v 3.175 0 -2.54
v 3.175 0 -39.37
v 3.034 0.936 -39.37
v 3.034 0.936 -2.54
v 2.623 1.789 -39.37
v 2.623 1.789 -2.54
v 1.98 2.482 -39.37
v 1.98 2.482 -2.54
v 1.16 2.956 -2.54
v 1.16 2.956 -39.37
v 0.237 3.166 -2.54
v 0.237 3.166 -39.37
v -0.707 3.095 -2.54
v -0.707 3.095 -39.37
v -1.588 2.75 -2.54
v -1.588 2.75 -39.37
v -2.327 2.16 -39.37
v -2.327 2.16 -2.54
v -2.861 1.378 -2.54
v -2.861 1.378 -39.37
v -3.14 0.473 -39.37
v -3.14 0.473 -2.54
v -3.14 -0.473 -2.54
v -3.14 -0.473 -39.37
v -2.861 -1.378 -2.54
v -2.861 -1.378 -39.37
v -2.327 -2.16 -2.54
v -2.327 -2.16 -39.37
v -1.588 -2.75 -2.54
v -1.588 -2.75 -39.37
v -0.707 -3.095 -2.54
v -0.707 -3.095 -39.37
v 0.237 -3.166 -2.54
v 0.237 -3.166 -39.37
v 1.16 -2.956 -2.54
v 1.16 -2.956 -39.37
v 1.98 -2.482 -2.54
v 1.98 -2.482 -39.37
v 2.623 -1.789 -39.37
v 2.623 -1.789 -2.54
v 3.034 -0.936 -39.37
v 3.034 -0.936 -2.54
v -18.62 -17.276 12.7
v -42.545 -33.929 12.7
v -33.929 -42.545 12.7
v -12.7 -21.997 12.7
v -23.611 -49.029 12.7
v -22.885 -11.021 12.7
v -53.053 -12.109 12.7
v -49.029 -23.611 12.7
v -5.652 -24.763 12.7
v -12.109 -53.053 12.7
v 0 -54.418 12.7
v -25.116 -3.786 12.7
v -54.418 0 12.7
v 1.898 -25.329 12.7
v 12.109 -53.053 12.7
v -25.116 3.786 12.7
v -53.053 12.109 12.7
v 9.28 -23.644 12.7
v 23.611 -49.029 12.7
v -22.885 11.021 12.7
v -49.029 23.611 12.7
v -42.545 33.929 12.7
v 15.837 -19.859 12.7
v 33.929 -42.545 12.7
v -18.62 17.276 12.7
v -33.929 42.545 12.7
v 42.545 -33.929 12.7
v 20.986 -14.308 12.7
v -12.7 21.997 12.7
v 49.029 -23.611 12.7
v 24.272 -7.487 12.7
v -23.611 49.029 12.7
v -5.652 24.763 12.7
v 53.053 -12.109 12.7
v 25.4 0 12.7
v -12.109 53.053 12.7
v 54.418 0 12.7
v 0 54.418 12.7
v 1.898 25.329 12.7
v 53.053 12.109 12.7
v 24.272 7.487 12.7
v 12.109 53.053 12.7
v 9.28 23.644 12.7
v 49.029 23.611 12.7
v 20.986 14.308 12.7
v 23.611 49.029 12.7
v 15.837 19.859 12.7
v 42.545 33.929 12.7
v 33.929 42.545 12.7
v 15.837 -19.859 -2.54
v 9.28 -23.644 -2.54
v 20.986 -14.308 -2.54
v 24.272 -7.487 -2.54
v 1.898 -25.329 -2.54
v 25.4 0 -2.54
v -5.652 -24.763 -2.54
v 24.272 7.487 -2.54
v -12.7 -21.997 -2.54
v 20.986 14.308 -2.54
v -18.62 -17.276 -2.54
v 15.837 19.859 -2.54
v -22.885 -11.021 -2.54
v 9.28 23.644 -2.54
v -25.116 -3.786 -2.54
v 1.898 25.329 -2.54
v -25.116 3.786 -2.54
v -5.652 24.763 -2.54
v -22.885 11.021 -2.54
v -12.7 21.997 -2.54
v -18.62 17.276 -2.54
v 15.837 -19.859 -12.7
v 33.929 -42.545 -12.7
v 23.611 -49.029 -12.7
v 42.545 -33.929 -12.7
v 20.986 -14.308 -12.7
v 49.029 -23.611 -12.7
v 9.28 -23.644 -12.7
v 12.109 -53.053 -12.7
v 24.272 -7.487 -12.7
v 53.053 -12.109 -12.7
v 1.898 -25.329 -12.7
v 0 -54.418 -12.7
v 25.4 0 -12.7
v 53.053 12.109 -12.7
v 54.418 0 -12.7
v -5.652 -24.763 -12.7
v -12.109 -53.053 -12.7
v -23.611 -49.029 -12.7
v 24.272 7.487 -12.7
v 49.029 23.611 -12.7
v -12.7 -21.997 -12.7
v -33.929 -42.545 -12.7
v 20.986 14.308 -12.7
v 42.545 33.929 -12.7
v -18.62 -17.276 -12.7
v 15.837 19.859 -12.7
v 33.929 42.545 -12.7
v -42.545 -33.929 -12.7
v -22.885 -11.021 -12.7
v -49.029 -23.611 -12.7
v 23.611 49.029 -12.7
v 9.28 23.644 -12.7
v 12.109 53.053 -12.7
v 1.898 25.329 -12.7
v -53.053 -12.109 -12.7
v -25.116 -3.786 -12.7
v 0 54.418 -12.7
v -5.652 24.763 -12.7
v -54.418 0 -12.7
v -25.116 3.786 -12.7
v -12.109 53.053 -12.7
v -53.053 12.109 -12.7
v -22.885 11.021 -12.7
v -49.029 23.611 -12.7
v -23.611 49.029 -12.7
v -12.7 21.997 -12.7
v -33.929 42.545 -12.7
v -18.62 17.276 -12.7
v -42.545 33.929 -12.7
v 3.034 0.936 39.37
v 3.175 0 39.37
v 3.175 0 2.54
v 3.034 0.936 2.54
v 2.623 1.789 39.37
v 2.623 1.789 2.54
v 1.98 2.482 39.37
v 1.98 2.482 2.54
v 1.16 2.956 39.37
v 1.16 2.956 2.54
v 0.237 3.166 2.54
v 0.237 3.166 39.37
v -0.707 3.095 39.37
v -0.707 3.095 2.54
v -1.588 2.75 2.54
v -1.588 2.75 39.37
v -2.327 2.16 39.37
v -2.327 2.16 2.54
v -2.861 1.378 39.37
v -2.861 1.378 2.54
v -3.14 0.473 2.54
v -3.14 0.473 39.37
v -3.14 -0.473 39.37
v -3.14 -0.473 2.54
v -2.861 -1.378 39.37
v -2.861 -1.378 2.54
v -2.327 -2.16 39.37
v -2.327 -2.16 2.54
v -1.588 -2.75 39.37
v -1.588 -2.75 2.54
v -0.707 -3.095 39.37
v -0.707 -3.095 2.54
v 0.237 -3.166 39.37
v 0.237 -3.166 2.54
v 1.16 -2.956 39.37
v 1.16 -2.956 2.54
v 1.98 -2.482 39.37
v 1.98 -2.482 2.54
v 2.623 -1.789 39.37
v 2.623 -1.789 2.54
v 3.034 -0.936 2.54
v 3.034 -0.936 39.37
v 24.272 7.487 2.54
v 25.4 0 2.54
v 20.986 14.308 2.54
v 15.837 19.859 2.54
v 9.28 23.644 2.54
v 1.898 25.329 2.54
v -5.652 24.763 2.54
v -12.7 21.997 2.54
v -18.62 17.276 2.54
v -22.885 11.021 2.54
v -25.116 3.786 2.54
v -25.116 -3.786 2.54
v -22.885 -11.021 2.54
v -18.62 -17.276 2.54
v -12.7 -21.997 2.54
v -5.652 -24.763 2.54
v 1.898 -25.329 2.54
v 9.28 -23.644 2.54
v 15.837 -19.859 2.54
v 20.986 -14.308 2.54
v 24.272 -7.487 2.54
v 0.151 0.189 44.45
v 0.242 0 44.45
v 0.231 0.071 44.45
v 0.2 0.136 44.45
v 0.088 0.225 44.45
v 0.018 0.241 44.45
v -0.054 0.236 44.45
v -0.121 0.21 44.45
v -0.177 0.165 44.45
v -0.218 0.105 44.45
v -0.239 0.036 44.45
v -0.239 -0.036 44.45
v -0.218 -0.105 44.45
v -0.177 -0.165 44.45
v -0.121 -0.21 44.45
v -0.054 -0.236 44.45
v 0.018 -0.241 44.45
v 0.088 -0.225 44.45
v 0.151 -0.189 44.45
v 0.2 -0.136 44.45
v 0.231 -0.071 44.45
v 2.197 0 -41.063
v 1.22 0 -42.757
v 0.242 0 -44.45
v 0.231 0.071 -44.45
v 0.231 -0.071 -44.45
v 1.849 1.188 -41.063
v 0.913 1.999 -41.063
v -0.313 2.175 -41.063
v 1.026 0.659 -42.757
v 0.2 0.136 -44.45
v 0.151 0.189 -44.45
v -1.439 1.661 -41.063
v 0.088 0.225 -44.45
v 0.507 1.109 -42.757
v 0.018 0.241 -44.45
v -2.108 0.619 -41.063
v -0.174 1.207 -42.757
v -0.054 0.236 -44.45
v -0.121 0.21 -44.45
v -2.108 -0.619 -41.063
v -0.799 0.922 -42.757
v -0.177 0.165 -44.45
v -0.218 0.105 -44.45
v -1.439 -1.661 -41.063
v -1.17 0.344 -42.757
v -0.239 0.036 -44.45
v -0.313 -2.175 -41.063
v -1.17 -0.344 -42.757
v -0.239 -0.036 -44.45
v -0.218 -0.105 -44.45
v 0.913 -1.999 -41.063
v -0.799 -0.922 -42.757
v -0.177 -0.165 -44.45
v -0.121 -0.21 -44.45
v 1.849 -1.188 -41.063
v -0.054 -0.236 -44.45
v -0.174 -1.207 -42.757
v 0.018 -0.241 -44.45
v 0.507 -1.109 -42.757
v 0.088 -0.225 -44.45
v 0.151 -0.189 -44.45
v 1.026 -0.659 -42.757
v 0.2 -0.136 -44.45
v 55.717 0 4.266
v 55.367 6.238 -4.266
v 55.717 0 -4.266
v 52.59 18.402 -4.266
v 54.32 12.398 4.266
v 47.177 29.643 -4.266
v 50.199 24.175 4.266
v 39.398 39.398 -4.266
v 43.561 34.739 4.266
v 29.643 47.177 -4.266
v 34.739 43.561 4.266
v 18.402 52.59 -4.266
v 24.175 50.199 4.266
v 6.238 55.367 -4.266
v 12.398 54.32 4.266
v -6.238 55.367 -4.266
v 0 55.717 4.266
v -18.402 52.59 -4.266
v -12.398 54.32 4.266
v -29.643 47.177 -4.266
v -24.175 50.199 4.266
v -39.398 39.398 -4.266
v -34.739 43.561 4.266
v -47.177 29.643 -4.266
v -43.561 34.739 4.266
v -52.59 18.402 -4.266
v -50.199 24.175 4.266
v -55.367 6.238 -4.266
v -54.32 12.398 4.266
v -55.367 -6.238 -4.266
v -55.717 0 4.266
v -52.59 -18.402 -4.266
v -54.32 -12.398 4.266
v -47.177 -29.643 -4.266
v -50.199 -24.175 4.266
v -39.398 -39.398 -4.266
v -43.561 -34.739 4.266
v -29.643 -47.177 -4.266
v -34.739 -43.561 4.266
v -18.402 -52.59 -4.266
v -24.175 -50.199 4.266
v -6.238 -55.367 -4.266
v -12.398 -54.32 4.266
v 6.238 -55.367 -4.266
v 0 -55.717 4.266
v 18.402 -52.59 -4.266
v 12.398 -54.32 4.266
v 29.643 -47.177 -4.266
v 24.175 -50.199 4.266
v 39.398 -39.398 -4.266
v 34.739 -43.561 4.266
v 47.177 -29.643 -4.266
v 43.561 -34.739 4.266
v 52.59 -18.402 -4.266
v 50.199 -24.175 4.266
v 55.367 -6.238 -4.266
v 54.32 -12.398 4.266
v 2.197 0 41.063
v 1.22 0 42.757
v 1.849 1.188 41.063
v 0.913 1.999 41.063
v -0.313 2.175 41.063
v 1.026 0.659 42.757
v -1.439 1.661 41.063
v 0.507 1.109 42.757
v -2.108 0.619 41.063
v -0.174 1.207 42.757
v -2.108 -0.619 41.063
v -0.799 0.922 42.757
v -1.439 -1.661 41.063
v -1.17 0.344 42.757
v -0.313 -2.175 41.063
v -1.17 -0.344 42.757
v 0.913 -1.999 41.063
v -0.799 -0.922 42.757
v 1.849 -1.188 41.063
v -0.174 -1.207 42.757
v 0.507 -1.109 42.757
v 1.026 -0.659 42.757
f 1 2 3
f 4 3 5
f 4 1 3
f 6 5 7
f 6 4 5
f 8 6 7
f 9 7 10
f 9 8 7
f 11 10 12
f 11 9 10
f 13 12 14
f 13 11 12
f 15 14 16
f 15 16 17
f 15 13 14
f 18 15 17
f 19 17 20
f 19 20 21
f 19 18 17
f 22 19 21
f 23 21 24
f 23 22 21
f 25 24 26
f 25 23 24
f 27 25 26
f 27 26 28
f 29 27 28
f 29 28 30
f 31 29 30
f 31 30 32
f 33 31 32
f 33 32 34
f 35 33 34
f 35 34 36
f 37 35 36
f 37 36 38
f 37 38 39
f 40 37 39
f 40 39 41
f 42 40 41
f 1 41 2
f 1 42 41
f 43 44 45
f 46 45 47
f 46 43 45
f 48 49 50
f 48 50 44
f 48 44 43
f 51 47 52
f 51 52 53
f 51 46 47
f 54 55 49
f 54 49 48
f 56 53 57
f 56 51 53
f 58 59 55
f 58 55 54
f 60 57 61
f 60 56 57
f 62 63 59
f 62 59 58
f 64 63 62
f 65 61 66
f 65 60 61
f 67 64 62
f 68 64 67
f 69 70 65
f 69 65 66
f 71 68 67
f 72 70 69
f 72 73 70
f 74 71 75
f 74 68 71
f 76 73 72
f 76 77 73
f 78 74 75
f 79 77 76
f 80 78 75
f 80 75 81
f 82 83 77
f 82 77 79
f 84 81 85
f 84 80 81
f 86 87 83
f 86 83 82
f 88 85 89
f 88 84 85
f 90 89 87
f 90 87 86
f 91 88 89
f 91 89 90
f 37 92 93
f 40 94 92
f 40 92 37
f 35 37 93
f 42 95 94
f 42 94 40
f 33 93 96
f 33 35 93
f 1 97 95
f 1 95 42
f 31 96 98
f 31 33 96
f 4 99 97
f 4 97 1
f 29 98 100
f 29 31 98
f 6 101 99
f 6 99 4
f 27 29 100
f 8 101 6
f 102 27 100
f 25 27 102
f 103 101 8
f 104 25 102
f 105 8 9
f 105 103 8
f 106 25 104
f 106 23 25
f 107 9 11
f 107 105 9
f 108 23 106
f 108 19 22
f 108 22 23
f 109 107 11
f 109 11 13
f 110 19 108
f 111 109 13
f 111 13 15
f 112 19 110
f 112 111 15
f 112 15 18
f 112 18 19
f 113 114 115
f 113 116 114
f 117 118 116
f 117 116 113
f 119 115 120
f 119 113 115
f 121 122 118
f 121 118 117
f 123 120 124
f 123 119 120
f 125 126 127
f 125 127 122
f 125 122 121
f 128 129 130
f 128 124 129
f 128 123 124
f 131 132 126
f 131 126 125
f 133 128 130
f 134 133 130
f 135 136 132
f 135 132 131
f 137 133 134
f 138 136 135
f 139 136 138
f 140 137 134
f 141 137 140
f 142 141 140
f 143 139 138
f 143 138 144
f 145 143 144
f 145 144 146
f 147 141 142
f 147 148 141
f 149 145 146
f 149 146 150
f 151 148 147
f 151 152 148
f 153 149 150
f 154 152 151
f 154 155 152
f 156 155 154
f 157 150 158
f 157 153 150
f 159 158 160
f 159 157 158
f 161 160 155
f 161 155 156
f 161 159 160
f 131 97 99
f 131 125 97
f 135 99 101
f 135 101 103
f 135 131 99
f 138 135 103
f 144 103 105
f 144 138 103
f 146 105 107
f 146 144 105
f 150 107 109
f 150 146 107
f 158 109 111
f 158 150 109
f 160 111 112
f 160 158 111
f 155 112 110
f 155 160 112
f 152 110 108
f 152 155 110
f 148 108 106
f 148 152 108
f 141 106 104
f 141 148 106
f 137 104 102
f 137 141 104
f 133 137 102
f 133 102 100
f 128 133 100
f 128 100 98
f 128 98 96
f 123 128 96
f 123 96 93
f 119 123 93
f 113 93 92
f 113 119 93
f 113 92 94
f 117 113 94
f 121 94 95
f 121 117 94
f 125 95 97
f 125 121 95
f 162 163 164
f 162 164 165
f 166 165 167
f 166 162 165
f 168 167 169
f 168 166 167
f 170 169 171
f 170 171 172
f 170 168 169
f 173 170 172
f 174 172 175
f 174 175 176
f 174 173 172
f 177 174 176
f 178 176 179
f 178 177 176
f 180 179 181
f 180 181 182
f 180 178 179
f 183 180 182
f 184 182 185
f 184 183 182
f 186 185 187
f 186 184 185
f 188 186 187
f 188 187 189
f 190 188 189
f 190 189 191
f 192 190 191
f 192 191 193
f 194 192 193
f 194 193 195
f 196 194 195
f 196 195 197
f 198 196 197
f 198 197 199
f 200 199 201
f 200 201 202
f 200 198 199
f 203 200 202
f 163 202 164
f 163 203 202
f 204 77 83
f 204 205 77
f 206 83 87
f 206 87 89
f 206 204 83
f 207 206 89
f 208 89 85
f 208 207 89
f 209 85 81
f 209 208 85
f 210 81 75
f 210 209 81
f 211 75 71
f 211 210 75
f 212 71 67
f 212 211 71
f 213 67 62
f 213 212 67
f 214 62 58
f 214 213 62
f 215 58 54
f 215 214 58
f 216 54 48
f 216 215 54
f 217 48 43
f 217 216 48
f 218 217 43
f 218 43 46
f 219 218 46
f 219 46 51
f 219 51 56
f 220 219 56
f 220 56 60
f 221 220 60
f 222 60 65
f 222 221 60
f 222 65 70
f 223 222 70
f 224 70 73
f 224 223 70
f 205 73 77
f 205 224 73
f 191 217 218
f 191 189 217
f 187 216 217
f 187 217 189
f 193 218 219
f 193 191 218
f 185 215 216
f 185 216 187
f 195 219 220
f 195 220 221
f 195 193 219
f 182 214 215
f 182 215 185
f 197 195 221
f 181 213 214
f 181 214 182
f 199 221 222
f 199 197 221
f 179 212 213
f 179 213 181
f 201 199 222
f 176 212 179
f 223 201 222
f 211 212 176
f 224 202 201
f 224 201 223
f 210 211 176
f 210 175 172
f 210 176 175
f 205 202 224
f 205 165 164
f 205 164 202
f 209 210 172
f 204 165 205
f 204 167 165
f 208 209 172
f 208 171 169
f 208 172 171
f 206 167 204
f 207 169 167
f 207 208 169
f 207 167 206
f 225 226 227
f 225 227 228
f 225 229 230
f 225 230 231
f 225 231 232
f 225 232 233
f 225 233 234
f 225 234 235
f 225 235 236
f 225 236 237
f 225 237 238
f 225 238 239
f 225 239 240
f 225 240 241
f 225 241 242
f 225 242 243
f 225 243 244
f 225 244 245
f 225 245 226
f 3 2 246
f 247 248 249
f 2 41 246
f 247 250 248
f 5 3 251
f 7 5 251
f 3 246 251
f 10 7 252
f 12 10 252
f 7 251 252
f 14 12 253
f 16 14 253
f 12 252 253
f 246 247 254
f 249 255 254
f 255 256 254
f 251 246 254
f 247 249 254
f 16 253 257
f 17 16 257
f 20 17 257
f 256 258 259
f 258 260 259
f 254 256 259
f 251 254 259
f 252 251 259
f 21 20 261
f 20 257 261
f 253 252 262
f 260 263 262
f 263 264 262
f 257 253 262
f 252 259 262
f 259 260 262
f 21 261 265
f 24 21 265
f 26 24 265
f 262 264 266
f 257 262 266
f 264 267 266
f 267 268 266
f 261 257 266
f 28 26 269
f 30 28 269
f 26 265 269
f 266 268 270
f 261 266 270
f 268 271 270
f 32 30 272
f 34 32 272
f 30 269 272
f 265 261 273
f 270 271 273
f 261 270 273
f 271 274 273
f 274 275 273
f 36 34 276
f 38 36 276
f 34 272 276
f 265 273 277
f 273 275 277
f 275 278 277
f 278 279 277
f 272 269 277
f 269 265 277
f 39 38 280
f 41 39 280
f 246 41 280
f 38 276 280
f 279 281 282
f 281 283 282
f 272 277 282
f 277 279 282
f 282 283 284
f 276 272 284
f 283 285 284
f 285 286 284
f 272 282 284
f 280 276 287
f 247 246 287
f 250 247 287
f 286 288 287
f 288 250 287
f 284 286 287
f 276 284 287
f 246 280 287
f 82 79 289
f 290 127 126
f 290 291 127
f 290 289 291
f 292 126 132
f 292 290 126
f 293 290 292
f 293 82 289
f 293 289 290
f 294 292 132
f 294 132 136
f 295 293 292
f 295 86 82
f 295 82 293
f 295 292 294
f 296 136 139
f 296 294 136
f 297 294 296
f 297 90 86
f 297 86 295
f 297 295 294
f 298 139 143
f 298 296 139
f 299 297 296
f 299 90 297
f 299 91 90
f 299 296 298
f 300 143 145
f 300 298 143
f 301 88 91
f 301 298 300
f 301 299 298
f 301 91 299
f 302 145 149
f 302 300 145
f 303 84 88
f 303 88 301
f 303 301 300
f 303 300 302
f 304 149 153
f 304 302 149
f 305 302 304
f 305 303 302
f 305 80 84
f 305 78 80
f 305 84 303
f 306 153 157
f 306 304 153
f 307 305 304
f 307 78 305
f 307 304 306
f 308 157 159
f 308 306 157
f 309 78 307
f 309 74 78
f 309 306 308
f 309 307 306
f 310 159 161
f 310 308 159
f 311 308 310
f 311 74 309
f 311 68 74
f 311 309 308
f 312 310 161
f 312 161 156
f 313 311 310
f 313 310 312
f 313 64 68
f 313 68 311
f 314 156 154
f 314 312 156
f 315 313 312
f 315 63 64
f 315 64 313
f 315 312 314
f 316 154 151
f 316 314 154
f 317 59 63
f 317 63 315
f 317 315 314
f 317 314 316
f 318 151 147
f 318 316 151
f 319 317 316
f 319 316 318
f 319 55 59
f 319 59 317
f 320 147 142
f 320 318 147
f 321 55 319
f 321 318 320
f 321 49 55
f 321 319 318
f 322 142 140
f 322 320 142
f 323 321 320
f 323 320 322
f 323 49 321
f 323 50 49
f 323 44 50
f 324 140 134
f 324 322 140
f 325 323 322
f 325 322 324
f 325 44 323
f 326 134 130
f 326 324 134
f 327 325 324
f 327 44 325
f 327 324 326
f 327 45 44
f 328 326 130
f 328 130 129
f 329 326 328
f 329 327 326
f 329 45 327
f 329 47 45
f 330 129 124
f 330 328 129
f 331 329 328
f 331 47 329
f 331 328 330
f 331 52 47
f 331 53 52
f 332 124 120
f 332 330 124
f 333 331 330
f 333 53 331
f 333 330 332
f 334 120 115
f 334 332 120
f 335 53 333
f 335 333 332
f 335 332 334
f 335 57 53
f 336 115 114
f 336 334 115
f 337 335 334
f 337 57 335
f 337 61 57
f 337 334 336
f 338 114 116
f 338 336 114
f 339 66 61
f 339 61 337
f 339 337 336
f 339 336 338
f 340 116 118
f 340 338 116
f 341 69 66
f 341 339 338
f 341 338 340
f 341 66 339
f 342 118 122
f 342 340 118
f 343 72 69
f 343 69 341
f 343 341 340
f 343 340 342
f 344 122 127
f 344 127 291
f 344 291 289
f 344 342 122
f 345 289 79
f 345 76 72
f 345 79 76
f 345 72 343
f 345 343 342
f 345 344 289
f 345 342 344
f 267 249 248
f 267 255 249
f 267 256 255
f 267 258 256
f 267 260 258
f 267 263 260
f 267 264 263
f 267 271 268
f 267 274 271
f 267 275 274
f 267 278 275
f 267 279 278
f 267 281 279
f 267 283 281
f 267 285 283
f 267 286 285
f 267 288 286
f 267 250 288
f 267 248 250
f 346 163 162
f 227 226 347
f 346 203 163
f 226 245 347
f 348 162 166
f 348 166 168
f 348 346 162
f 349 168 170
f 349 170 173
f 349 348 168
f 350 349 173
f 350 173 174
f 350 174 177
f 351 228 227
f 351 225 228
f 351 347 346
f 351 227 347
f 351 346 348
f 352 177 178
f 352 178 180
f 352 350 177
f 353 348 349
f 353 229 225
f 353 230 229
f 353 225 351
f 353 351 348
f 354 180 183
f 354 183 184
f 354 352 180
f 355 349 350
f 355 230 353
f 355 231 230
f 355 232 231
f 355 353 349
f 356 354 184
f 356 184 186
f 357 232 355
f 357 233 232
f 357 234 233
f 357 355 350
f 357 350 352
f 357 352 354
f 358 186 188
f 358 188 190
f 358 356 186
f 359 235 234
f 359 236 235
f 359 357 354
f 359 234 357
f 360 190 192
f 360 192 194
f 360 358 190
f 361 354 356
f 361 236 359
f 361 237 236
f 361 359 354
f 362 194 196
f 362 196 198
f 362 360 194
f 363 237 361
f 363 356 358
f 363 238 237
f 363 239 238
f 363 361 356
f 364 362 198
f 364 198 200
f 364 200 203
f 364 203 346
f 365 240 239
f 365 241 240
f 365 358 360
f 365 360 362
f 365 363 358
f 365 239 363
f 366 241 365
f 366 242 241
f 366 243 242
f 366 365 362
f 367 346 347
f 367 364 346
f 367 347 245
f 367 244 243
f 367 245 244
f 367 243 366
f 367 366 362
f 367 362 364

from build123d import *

# Parameters (mm, degrees)
F3_SIZE2 = 2.9329393675
F3_SIZE  = 5.08


# Not quite as in the source:
# - a fillet or chamfer that OpenCascade refuses, or shapes differently, is made with other operations: its cross-section is extruded or revolved along the edge and cut away or added


with BuildPart() as f1:
    # F0 (on Front) → F1 (revolve)
    with BuildSketch(Plane.XZ):
        Polygon((3.175, 44.45), (0, 44.45), (0, 0), (50.8, 0), (50.8, 12.7), (25.478093854, 12.7), (25.4, 12.7), (25.4, 2.54), (3.175, 2.54), align=None)
        Polygon((50.8, 0), (0, 0), (0, -44.45), (3.175, -44.45), (3.175, -2.54), (25.4, -2.54), (25.4, -12.7), (50.8, -12.7), align=None)
    revolve(axis=Axis((0, 0, 0), (0, 0, 1)))

    # F2: chamfer of 5.08 x 2.9329393675 on 1 edges, made by hand

    # F2_s1 → F2_t2 (revolve, cut)
    with BuildSketch(Plane.XZ):
        Polygon((3.175, 39.37), (0.2420606325, 44.45), (3.175, 44.45), align=None)
    revolve(axis=Axis((0, 0, 44.45), (0, 0, 1)), mode=Mode.SUBTRACT)

    # F3
    f3_edges = [f1.edges().sort_by_distance(p)[0] for p in [
        (-3.175, 0, -44.45),
    ]]
    chamfer(f3_edges, length=F3_SIZE, length2=F3_SIZE2)

    # F4 (on Front) → F5 (revolve)
    with BuildSketch(Plane.XZ):
        with BuildLine():
            Line((50.8, -12.7), (54.4176846255, -12.7))
            ThreePointArc((54.4176846255, -12.7), (55.88, 0), (54.4176846255, 12.7))
            Line((54.4176846255, 12.7), (50.8, 12.7))
            Line((50.8, 12.7), (50.8, -12.7))
        make_face()
    revolve(axis=Axis((0, 0, 12.7), (0, 0, 1)))


solid = f1.part
